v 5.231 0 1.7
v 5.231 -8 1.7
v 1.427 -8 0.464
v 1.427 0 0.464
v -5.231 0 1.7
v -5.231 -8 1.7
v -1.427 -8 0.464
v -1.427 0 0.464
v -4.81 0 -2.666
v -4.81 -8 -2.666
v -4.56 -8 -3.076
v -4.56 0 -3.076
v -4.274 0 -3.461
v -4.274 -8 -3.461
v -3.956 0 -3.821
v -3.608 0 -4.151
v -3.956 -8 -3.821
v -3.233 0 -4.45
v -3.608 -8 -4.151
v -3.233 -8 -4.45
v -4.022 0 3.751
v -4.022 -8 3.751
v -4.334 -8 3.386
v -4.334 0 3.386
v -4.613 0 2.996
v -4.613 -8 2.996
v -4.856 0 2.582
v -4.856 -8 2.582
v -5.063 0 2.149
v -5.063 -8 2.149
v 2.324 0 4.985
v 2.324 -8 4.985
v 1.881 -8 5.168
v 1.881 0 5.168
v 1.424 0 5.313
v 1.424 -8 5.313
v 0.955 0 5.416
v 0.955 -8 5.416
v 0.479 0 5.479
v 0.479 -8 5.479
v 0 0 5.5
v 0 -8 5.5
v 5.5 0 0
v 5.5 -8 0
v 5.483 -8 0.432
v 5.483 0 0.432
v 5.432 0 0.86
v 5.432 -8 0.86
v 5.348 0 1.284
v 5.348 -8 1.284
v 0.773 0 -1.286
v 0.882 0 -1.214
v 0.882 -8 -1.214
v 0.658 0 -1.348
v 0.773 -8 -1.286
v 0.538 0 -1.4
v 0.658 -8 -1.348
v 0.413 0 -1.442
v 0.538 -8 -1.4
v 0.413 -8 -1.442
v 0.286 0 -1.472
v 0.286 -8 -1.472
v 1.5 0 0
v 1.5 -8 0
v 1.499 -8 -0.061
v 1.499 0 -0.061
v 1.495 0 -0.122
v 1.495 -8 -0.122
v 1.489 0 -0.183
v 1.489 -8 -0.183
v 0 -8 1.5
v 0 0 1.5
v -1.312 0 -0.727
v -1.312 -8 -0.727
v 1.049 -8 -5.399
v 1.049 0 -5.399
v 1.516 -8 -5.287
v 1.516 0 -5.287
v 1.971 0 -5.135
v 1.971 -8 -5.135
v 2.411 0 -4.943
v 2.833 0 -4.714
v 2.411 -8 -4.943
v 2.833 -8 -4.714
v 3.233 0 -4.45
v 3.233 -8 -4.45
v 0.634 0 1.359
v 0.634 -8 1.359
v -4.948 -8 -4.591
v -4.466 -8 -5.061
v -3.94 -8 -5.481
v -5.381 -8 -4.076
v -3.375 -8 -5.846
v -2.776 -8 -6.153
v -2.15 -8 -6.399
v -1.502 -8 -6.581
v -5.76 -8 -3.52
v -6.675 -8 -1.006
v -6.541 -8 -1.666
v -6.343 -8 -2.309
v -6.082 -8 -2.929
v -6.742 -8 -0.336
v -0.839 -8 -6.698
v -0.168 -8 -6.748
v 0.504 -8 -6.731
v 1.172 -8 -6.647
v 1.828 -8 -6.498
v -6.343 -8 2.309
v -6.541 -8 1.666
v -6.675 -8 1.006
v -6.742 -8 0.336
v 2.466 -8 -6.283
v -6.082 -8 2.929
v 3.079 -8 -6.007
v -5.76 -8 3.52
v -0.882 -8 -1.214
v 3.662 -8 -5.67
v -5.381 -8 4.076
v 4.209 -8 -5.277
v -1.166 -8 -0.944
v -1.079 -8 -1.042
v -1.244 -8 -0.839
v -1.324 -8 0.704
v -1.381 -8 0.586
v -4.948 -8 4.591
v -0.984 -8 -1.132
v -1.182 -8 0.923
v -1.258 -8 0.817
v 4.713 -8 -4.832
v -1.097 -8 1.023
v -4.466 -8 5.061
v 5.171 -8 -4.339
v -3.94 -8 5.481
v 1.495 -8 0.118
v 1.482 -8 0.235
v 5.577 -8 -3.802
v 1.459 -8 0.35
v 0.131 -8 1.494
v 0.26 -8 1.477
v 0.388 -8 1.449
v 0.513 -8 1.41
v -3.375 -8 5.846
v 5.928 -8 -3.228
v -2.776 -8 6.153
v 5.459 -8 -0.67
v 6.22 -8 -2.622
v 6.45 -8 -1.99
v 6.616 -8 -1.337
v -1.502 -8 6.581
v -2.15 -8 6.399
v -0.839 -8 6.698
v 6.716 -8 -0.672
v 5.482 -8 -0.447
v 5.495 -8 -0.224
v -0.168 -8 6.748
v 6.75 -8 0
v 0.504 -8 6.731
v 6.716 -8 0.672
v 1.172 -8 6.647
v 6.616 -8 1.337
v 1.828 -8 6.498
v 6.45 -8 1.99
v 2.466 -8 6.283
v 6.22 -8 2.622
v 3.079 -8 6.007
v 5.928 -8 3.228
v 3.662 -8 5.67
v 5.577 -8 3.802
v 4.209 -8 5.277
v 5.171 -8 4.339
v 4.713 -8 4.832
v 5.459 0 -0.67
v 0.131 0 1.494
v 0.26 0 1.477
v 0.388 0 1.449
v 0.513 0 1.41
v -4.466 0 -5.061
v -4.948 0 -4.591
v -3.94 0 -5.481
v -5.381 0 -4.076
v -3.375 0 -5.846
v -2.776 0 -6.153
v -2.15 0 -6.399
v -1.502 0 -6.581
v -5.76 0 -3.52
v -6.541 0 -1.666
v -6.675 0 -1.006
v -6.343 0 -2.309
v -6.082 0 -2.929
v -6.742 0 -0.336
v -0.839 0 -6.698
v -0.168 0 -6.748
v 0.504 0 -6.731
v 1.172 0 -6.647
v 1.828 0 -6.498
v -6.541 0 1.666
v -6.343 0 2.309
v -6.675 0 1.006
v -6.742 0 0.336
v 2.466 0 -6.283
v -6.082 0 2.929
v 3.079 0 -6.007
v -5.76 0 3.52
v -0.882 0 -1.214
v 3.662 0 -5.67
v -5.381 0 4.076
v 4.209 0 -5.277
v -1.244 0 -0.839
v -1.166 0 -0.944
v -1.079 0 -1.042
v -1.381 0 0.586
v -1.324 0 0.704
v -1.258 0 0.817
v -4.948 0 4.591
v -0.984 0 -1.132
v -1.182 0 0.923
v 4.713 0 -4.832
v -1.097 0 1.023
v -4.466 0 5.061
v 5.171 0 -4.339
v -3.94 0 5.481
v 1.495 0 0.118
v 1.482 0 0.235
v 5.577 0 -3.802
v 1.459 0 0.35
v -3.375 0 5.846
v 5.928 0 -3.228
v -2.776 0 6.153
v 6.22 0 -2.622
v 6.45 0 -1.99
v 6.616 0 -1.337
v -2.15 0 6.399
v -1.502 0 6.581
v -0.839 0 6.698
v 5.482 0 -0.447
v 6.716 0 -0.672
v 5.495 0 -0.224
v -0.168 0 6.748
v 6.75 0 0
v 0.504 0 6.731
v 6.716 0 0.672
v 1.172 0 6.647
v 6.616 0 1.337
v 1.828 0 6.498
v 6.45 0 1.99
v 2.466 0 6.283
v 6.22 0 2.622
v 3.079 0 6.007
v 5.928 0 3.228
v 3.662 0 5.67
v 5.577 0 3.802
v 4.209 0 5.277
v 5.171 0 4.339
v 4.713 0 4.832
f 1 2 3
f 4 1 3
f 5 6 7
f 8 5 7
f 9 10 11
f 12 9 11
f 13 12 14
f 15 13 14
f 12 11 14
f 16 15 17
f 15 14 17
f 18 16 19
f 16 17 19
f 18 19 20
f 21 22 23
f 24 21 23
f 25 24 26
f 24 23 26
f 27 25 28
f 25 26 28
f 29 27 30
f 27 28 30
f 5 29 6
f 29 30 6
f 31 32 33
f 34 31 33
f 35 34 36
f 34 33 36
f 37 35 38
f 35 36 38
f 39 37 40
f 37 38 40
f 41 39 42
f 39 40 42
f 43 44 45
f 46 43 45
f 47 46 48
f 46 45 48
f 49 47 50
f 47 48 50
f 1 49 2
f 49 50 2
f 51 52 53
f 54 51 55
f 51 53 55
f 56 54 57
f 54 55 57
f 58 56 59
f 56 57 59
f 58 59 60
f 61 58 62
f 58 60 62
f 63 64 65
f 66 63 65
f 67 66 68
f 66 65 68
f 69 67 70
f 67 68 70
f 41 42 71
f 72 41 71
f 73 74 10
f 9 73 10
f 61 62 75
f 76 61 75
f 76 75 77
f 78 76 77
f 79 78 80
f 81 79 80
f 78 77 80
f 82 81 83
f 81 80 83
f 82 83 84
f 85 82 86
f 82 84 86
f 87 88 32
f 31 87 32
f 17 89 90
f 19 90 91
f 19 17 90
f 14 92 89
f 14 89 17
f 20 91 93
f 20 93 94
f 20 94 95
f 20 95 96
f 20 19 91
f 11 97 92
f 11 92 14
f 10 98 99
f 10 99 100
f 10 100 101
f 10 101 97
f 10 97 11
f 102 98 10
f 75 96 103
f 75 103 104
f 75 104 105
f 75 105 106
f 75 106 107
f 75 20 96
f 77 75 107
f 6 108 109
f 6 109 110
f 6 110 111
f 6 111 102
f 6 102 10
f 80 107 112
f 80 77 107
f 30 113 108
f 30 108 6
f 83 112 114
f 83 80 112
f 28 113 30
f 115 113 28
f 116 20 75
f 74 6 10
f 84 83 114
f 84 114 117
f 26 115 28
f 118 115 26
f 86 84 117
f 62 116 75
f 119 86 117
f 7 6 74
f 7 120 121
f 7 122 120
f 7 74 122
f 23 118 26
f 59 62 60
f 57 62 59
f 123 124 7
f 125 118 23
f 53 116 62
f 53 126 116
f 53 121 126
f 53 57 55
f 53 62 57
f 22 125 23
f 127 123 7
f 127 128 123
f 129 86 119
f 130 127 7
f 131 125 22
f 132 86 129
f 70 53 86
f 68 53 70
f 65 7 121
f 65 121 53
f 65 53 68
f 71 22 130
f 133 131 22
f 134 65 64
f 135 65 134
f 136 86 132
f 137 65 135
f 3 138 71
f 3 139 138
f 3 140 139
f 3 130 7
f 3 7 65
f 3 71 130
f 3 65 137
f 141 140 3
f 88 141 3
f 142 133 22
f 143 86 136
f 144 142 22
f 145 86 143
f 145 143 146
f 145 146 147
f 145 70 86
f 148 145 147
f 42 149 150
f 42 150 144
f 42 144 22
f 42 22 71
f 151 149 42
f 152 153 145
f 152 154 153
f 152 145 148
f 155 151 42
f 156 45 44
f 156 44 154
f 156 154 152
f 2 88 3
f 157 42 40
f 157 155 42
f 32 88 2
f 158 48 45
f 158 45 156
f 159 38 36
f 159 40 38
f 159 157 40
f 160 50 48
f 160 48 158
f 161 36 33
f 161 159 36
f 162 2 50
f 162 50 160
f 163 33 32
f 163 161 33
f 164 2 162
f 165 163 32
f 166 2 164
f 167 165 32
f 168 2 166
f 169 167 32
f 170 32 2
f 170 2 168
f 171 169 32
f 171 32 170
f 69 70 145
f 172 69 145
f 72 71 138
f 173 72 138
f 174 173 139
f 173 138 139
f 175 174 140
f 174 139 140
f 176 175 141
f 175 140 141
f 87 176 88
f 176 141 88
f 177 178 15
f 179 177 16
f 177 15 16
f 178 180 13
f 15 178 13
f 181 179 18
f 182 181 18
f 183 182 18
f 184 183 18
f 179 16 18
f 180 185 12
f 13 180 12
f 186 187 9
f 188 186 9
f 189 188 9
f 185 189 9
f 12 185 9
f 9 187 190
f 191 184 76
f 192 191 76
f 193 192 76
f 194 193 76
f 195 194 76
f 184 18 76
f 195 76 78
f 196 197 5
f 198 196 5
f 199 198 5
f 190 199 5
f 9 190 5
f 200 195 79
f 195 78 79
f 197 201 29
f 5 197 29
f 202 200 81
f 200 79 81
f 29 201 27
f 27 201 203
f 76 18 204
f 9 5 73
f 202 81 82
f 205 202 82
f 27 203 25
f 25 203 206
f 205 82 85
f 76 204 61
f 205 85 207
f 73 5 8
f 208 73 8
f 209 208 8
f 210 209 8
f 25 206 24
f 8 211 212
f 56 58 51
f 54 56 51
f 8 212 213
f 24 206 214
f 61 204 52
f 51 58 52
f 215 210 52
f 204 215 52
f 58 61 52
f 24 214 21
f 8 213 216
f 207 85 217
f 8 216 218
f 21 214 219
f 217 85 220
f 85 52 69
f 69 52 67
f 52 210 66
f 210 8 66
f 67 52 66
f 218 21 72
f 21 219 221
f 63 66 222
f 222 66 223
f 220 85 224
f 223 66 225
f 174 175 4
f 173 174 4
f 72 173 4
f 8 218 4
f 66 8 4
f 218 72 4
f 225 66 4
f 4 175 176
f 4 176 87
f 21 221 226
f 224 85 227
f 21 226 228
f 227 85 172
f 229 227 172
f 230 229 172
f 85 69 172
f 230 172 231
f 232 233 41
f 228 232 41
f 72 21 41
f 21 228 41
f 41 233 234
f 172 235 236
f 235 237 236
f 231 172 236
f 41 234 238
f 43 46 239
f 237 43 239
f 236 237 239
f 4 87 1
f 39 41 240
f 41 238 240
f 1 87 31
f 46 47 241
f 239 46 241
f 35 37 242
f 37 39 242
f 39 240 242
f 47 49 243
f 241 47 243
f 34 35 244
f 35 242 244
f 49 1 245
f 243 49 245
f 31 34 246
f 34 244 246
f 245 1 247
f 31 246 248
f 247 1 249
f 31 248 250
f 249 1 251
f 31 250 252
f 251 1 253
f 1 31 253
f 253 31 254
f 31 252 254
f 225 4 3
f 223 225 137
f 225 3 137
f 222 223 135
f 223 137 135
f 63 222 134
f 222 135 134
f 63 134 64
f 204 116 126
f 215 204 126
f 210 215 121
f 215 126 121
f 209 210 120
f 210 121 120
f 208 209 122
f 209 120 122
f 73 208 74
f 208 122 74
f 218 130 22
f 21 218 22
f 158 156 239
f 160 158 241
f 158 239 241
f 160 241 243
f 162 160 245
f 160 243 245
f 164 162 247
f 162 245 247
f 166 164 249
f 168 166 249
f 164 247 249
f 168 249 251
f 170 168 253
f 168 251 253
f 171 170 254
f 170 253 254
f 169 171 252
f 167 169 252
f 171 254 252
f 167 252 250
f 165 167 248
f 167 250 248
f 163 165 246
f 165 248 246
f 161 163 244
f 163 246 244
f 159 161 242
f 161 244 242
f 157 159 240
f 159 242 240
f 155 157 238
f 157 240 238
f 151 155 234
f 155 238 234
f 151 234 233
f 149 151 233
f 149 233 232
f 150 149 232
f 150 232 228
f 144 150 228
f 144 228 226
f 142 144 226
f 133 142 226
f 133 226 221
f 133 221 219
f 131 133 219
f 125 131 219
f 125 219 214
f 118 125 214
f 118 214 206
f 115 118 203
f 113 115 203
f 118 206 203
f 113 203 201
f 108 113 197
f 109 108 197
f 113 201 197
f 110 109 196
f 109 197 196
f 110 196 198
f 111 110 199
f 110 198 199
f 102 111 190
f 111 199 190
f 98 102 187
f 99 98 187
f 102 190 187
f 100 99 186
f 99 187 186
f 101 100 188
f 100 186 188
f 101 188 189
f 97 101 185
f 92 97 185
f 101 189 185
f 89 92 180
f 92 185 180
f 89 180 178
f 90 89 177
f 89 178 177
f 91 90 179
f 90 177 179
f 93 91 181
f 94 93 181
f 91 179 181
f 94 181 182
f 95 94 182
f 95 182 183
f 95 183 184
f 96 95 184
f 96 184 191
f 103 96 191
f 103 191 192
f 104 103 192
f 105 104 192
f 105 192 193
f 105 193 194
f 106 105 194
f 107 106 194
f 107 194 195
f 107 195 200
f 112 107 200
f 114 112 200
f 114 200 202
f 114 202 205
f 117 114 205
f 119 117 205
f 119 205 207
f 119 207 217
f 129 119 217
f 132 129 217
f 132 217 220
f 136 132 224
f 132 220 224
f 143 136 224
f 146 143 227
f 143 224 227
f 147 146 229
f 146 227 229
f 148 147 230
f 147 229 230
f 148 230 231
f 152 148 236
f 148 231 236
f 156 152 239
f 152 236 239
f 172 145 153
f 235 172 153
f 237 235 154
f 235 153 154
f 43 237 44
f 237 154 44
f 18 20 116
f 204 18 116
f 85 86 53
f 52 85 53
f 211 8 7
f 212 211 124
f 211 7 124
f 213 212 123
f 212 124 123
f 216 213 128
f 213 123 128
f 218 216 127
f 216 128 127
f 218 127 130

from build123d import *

# Parameters (mm, degrees)
F0_R     = 6.75
F1_DEPTH = 8
F3_DEPTH = 8.001


with BuildPart() as f1:
    # F0 (on Front) → F1 (new body)
    with BuildSketch(Plane.XZ):
        Circle(F0_R)
    extrude(amount=F1_DEPTH)

    # F2 (on face) → F3 (cut, through all)
    with BuildSketch(Plane.XZ.offset(8)):
        with BuildLine():
            ThreePointArc((-1.4265847744, 0.4635254916), (-1.2924437407, 0.7613075444), (-1.0970305524, 1.0229975401))
            Line((-1.0970305524, 1.0229975401), (-4.0224453589, 3.7509909803))
            ThreePointArc((-4.0224453589, 3.7509909803), (-4.7389603824, 2.7914609963), (-5.2308108396, 1.6995934691))
            Line((-5.2308108396, 1.6995934691), (-1.4265847744, 0.4635254916))
        make_face()
        with BuildLine():
            ThreePointArc((0, 1.5), (0.3246594209, 1.4644440107), (0.6339273926, 1.3594616806))
            Line((0.6339273926, 1.3594616806), (2.3244004396, 4.9846928287))
            ThreePointArc((2.3244004396, 4.9846928287), (1.1904178767, 5.3696280392), (0, 5.5))
            Line((0, 5.5), (0, 1.5))
        make_face()
        with BuildLine():
            ThreePointArc((1.4265847744, 0.4635254916), (1.4815325109, 0.2346516976), (1.5, 0))
            ThreePointArc((1.5, 0), (1.4972021976, -0.0915728093), (1.4888192275, -0.1828040151))
            Line((1.4888192275, -0.1828040151), (5.459003834, -0.6702813887))
            ThreePointArc((5.459003834, -0.6702813887), (5.4897413913, -0.3357669674), (5.5, 0))
            ThreePointArc((5.5, 0), (5.4322858733, 0.8603895577), (5.2308108396, 1.6995934691))
            Line((5.2308108396, 1.6995934691), (1.4265847744, 0.4635254916))
        make_face()
        with BuildLine():
            Line((3.2328188876, -4.4495934691), (0.8816778784, -1.2135254916))
            ThreePointArc((0.8816778784, -1.2135254916), (0.5981236034, -1.3755901116), (0.2862134931, -1.4724407752))
            Line((0.2862134931, -1.4724407752), (1.0494494746, -5.398949509))
            ThreePointArc((1.0494494746, -5.398949509), (2.1931198791, -5.0438304091), (3.2328188876, -4.4495934691))
        make_face()
        with BuildLine():
            Line((-3.2328188876, -4.4495934691), (-0.8816778784, -1.2135254916))
            ThreePointArc((-0.8816778784, -1.2135254916), (-1.1234335812, -0.9939300723), (-1.3119295607, -0.7272144304))
            Line((-1.3119295607, -0.7272144304), (-4.8104083893, -2.6664529114))
            ThreePointArc((-4.8104083893, -2.6664529114), (-4.1192564643, -3.6444102652), (-3.2328188876, -4.4495934691))
        make_face()
    extrude(amount=-F3_DEPTH, mode=Mode.SUBTRACT)


solid = f1.part
